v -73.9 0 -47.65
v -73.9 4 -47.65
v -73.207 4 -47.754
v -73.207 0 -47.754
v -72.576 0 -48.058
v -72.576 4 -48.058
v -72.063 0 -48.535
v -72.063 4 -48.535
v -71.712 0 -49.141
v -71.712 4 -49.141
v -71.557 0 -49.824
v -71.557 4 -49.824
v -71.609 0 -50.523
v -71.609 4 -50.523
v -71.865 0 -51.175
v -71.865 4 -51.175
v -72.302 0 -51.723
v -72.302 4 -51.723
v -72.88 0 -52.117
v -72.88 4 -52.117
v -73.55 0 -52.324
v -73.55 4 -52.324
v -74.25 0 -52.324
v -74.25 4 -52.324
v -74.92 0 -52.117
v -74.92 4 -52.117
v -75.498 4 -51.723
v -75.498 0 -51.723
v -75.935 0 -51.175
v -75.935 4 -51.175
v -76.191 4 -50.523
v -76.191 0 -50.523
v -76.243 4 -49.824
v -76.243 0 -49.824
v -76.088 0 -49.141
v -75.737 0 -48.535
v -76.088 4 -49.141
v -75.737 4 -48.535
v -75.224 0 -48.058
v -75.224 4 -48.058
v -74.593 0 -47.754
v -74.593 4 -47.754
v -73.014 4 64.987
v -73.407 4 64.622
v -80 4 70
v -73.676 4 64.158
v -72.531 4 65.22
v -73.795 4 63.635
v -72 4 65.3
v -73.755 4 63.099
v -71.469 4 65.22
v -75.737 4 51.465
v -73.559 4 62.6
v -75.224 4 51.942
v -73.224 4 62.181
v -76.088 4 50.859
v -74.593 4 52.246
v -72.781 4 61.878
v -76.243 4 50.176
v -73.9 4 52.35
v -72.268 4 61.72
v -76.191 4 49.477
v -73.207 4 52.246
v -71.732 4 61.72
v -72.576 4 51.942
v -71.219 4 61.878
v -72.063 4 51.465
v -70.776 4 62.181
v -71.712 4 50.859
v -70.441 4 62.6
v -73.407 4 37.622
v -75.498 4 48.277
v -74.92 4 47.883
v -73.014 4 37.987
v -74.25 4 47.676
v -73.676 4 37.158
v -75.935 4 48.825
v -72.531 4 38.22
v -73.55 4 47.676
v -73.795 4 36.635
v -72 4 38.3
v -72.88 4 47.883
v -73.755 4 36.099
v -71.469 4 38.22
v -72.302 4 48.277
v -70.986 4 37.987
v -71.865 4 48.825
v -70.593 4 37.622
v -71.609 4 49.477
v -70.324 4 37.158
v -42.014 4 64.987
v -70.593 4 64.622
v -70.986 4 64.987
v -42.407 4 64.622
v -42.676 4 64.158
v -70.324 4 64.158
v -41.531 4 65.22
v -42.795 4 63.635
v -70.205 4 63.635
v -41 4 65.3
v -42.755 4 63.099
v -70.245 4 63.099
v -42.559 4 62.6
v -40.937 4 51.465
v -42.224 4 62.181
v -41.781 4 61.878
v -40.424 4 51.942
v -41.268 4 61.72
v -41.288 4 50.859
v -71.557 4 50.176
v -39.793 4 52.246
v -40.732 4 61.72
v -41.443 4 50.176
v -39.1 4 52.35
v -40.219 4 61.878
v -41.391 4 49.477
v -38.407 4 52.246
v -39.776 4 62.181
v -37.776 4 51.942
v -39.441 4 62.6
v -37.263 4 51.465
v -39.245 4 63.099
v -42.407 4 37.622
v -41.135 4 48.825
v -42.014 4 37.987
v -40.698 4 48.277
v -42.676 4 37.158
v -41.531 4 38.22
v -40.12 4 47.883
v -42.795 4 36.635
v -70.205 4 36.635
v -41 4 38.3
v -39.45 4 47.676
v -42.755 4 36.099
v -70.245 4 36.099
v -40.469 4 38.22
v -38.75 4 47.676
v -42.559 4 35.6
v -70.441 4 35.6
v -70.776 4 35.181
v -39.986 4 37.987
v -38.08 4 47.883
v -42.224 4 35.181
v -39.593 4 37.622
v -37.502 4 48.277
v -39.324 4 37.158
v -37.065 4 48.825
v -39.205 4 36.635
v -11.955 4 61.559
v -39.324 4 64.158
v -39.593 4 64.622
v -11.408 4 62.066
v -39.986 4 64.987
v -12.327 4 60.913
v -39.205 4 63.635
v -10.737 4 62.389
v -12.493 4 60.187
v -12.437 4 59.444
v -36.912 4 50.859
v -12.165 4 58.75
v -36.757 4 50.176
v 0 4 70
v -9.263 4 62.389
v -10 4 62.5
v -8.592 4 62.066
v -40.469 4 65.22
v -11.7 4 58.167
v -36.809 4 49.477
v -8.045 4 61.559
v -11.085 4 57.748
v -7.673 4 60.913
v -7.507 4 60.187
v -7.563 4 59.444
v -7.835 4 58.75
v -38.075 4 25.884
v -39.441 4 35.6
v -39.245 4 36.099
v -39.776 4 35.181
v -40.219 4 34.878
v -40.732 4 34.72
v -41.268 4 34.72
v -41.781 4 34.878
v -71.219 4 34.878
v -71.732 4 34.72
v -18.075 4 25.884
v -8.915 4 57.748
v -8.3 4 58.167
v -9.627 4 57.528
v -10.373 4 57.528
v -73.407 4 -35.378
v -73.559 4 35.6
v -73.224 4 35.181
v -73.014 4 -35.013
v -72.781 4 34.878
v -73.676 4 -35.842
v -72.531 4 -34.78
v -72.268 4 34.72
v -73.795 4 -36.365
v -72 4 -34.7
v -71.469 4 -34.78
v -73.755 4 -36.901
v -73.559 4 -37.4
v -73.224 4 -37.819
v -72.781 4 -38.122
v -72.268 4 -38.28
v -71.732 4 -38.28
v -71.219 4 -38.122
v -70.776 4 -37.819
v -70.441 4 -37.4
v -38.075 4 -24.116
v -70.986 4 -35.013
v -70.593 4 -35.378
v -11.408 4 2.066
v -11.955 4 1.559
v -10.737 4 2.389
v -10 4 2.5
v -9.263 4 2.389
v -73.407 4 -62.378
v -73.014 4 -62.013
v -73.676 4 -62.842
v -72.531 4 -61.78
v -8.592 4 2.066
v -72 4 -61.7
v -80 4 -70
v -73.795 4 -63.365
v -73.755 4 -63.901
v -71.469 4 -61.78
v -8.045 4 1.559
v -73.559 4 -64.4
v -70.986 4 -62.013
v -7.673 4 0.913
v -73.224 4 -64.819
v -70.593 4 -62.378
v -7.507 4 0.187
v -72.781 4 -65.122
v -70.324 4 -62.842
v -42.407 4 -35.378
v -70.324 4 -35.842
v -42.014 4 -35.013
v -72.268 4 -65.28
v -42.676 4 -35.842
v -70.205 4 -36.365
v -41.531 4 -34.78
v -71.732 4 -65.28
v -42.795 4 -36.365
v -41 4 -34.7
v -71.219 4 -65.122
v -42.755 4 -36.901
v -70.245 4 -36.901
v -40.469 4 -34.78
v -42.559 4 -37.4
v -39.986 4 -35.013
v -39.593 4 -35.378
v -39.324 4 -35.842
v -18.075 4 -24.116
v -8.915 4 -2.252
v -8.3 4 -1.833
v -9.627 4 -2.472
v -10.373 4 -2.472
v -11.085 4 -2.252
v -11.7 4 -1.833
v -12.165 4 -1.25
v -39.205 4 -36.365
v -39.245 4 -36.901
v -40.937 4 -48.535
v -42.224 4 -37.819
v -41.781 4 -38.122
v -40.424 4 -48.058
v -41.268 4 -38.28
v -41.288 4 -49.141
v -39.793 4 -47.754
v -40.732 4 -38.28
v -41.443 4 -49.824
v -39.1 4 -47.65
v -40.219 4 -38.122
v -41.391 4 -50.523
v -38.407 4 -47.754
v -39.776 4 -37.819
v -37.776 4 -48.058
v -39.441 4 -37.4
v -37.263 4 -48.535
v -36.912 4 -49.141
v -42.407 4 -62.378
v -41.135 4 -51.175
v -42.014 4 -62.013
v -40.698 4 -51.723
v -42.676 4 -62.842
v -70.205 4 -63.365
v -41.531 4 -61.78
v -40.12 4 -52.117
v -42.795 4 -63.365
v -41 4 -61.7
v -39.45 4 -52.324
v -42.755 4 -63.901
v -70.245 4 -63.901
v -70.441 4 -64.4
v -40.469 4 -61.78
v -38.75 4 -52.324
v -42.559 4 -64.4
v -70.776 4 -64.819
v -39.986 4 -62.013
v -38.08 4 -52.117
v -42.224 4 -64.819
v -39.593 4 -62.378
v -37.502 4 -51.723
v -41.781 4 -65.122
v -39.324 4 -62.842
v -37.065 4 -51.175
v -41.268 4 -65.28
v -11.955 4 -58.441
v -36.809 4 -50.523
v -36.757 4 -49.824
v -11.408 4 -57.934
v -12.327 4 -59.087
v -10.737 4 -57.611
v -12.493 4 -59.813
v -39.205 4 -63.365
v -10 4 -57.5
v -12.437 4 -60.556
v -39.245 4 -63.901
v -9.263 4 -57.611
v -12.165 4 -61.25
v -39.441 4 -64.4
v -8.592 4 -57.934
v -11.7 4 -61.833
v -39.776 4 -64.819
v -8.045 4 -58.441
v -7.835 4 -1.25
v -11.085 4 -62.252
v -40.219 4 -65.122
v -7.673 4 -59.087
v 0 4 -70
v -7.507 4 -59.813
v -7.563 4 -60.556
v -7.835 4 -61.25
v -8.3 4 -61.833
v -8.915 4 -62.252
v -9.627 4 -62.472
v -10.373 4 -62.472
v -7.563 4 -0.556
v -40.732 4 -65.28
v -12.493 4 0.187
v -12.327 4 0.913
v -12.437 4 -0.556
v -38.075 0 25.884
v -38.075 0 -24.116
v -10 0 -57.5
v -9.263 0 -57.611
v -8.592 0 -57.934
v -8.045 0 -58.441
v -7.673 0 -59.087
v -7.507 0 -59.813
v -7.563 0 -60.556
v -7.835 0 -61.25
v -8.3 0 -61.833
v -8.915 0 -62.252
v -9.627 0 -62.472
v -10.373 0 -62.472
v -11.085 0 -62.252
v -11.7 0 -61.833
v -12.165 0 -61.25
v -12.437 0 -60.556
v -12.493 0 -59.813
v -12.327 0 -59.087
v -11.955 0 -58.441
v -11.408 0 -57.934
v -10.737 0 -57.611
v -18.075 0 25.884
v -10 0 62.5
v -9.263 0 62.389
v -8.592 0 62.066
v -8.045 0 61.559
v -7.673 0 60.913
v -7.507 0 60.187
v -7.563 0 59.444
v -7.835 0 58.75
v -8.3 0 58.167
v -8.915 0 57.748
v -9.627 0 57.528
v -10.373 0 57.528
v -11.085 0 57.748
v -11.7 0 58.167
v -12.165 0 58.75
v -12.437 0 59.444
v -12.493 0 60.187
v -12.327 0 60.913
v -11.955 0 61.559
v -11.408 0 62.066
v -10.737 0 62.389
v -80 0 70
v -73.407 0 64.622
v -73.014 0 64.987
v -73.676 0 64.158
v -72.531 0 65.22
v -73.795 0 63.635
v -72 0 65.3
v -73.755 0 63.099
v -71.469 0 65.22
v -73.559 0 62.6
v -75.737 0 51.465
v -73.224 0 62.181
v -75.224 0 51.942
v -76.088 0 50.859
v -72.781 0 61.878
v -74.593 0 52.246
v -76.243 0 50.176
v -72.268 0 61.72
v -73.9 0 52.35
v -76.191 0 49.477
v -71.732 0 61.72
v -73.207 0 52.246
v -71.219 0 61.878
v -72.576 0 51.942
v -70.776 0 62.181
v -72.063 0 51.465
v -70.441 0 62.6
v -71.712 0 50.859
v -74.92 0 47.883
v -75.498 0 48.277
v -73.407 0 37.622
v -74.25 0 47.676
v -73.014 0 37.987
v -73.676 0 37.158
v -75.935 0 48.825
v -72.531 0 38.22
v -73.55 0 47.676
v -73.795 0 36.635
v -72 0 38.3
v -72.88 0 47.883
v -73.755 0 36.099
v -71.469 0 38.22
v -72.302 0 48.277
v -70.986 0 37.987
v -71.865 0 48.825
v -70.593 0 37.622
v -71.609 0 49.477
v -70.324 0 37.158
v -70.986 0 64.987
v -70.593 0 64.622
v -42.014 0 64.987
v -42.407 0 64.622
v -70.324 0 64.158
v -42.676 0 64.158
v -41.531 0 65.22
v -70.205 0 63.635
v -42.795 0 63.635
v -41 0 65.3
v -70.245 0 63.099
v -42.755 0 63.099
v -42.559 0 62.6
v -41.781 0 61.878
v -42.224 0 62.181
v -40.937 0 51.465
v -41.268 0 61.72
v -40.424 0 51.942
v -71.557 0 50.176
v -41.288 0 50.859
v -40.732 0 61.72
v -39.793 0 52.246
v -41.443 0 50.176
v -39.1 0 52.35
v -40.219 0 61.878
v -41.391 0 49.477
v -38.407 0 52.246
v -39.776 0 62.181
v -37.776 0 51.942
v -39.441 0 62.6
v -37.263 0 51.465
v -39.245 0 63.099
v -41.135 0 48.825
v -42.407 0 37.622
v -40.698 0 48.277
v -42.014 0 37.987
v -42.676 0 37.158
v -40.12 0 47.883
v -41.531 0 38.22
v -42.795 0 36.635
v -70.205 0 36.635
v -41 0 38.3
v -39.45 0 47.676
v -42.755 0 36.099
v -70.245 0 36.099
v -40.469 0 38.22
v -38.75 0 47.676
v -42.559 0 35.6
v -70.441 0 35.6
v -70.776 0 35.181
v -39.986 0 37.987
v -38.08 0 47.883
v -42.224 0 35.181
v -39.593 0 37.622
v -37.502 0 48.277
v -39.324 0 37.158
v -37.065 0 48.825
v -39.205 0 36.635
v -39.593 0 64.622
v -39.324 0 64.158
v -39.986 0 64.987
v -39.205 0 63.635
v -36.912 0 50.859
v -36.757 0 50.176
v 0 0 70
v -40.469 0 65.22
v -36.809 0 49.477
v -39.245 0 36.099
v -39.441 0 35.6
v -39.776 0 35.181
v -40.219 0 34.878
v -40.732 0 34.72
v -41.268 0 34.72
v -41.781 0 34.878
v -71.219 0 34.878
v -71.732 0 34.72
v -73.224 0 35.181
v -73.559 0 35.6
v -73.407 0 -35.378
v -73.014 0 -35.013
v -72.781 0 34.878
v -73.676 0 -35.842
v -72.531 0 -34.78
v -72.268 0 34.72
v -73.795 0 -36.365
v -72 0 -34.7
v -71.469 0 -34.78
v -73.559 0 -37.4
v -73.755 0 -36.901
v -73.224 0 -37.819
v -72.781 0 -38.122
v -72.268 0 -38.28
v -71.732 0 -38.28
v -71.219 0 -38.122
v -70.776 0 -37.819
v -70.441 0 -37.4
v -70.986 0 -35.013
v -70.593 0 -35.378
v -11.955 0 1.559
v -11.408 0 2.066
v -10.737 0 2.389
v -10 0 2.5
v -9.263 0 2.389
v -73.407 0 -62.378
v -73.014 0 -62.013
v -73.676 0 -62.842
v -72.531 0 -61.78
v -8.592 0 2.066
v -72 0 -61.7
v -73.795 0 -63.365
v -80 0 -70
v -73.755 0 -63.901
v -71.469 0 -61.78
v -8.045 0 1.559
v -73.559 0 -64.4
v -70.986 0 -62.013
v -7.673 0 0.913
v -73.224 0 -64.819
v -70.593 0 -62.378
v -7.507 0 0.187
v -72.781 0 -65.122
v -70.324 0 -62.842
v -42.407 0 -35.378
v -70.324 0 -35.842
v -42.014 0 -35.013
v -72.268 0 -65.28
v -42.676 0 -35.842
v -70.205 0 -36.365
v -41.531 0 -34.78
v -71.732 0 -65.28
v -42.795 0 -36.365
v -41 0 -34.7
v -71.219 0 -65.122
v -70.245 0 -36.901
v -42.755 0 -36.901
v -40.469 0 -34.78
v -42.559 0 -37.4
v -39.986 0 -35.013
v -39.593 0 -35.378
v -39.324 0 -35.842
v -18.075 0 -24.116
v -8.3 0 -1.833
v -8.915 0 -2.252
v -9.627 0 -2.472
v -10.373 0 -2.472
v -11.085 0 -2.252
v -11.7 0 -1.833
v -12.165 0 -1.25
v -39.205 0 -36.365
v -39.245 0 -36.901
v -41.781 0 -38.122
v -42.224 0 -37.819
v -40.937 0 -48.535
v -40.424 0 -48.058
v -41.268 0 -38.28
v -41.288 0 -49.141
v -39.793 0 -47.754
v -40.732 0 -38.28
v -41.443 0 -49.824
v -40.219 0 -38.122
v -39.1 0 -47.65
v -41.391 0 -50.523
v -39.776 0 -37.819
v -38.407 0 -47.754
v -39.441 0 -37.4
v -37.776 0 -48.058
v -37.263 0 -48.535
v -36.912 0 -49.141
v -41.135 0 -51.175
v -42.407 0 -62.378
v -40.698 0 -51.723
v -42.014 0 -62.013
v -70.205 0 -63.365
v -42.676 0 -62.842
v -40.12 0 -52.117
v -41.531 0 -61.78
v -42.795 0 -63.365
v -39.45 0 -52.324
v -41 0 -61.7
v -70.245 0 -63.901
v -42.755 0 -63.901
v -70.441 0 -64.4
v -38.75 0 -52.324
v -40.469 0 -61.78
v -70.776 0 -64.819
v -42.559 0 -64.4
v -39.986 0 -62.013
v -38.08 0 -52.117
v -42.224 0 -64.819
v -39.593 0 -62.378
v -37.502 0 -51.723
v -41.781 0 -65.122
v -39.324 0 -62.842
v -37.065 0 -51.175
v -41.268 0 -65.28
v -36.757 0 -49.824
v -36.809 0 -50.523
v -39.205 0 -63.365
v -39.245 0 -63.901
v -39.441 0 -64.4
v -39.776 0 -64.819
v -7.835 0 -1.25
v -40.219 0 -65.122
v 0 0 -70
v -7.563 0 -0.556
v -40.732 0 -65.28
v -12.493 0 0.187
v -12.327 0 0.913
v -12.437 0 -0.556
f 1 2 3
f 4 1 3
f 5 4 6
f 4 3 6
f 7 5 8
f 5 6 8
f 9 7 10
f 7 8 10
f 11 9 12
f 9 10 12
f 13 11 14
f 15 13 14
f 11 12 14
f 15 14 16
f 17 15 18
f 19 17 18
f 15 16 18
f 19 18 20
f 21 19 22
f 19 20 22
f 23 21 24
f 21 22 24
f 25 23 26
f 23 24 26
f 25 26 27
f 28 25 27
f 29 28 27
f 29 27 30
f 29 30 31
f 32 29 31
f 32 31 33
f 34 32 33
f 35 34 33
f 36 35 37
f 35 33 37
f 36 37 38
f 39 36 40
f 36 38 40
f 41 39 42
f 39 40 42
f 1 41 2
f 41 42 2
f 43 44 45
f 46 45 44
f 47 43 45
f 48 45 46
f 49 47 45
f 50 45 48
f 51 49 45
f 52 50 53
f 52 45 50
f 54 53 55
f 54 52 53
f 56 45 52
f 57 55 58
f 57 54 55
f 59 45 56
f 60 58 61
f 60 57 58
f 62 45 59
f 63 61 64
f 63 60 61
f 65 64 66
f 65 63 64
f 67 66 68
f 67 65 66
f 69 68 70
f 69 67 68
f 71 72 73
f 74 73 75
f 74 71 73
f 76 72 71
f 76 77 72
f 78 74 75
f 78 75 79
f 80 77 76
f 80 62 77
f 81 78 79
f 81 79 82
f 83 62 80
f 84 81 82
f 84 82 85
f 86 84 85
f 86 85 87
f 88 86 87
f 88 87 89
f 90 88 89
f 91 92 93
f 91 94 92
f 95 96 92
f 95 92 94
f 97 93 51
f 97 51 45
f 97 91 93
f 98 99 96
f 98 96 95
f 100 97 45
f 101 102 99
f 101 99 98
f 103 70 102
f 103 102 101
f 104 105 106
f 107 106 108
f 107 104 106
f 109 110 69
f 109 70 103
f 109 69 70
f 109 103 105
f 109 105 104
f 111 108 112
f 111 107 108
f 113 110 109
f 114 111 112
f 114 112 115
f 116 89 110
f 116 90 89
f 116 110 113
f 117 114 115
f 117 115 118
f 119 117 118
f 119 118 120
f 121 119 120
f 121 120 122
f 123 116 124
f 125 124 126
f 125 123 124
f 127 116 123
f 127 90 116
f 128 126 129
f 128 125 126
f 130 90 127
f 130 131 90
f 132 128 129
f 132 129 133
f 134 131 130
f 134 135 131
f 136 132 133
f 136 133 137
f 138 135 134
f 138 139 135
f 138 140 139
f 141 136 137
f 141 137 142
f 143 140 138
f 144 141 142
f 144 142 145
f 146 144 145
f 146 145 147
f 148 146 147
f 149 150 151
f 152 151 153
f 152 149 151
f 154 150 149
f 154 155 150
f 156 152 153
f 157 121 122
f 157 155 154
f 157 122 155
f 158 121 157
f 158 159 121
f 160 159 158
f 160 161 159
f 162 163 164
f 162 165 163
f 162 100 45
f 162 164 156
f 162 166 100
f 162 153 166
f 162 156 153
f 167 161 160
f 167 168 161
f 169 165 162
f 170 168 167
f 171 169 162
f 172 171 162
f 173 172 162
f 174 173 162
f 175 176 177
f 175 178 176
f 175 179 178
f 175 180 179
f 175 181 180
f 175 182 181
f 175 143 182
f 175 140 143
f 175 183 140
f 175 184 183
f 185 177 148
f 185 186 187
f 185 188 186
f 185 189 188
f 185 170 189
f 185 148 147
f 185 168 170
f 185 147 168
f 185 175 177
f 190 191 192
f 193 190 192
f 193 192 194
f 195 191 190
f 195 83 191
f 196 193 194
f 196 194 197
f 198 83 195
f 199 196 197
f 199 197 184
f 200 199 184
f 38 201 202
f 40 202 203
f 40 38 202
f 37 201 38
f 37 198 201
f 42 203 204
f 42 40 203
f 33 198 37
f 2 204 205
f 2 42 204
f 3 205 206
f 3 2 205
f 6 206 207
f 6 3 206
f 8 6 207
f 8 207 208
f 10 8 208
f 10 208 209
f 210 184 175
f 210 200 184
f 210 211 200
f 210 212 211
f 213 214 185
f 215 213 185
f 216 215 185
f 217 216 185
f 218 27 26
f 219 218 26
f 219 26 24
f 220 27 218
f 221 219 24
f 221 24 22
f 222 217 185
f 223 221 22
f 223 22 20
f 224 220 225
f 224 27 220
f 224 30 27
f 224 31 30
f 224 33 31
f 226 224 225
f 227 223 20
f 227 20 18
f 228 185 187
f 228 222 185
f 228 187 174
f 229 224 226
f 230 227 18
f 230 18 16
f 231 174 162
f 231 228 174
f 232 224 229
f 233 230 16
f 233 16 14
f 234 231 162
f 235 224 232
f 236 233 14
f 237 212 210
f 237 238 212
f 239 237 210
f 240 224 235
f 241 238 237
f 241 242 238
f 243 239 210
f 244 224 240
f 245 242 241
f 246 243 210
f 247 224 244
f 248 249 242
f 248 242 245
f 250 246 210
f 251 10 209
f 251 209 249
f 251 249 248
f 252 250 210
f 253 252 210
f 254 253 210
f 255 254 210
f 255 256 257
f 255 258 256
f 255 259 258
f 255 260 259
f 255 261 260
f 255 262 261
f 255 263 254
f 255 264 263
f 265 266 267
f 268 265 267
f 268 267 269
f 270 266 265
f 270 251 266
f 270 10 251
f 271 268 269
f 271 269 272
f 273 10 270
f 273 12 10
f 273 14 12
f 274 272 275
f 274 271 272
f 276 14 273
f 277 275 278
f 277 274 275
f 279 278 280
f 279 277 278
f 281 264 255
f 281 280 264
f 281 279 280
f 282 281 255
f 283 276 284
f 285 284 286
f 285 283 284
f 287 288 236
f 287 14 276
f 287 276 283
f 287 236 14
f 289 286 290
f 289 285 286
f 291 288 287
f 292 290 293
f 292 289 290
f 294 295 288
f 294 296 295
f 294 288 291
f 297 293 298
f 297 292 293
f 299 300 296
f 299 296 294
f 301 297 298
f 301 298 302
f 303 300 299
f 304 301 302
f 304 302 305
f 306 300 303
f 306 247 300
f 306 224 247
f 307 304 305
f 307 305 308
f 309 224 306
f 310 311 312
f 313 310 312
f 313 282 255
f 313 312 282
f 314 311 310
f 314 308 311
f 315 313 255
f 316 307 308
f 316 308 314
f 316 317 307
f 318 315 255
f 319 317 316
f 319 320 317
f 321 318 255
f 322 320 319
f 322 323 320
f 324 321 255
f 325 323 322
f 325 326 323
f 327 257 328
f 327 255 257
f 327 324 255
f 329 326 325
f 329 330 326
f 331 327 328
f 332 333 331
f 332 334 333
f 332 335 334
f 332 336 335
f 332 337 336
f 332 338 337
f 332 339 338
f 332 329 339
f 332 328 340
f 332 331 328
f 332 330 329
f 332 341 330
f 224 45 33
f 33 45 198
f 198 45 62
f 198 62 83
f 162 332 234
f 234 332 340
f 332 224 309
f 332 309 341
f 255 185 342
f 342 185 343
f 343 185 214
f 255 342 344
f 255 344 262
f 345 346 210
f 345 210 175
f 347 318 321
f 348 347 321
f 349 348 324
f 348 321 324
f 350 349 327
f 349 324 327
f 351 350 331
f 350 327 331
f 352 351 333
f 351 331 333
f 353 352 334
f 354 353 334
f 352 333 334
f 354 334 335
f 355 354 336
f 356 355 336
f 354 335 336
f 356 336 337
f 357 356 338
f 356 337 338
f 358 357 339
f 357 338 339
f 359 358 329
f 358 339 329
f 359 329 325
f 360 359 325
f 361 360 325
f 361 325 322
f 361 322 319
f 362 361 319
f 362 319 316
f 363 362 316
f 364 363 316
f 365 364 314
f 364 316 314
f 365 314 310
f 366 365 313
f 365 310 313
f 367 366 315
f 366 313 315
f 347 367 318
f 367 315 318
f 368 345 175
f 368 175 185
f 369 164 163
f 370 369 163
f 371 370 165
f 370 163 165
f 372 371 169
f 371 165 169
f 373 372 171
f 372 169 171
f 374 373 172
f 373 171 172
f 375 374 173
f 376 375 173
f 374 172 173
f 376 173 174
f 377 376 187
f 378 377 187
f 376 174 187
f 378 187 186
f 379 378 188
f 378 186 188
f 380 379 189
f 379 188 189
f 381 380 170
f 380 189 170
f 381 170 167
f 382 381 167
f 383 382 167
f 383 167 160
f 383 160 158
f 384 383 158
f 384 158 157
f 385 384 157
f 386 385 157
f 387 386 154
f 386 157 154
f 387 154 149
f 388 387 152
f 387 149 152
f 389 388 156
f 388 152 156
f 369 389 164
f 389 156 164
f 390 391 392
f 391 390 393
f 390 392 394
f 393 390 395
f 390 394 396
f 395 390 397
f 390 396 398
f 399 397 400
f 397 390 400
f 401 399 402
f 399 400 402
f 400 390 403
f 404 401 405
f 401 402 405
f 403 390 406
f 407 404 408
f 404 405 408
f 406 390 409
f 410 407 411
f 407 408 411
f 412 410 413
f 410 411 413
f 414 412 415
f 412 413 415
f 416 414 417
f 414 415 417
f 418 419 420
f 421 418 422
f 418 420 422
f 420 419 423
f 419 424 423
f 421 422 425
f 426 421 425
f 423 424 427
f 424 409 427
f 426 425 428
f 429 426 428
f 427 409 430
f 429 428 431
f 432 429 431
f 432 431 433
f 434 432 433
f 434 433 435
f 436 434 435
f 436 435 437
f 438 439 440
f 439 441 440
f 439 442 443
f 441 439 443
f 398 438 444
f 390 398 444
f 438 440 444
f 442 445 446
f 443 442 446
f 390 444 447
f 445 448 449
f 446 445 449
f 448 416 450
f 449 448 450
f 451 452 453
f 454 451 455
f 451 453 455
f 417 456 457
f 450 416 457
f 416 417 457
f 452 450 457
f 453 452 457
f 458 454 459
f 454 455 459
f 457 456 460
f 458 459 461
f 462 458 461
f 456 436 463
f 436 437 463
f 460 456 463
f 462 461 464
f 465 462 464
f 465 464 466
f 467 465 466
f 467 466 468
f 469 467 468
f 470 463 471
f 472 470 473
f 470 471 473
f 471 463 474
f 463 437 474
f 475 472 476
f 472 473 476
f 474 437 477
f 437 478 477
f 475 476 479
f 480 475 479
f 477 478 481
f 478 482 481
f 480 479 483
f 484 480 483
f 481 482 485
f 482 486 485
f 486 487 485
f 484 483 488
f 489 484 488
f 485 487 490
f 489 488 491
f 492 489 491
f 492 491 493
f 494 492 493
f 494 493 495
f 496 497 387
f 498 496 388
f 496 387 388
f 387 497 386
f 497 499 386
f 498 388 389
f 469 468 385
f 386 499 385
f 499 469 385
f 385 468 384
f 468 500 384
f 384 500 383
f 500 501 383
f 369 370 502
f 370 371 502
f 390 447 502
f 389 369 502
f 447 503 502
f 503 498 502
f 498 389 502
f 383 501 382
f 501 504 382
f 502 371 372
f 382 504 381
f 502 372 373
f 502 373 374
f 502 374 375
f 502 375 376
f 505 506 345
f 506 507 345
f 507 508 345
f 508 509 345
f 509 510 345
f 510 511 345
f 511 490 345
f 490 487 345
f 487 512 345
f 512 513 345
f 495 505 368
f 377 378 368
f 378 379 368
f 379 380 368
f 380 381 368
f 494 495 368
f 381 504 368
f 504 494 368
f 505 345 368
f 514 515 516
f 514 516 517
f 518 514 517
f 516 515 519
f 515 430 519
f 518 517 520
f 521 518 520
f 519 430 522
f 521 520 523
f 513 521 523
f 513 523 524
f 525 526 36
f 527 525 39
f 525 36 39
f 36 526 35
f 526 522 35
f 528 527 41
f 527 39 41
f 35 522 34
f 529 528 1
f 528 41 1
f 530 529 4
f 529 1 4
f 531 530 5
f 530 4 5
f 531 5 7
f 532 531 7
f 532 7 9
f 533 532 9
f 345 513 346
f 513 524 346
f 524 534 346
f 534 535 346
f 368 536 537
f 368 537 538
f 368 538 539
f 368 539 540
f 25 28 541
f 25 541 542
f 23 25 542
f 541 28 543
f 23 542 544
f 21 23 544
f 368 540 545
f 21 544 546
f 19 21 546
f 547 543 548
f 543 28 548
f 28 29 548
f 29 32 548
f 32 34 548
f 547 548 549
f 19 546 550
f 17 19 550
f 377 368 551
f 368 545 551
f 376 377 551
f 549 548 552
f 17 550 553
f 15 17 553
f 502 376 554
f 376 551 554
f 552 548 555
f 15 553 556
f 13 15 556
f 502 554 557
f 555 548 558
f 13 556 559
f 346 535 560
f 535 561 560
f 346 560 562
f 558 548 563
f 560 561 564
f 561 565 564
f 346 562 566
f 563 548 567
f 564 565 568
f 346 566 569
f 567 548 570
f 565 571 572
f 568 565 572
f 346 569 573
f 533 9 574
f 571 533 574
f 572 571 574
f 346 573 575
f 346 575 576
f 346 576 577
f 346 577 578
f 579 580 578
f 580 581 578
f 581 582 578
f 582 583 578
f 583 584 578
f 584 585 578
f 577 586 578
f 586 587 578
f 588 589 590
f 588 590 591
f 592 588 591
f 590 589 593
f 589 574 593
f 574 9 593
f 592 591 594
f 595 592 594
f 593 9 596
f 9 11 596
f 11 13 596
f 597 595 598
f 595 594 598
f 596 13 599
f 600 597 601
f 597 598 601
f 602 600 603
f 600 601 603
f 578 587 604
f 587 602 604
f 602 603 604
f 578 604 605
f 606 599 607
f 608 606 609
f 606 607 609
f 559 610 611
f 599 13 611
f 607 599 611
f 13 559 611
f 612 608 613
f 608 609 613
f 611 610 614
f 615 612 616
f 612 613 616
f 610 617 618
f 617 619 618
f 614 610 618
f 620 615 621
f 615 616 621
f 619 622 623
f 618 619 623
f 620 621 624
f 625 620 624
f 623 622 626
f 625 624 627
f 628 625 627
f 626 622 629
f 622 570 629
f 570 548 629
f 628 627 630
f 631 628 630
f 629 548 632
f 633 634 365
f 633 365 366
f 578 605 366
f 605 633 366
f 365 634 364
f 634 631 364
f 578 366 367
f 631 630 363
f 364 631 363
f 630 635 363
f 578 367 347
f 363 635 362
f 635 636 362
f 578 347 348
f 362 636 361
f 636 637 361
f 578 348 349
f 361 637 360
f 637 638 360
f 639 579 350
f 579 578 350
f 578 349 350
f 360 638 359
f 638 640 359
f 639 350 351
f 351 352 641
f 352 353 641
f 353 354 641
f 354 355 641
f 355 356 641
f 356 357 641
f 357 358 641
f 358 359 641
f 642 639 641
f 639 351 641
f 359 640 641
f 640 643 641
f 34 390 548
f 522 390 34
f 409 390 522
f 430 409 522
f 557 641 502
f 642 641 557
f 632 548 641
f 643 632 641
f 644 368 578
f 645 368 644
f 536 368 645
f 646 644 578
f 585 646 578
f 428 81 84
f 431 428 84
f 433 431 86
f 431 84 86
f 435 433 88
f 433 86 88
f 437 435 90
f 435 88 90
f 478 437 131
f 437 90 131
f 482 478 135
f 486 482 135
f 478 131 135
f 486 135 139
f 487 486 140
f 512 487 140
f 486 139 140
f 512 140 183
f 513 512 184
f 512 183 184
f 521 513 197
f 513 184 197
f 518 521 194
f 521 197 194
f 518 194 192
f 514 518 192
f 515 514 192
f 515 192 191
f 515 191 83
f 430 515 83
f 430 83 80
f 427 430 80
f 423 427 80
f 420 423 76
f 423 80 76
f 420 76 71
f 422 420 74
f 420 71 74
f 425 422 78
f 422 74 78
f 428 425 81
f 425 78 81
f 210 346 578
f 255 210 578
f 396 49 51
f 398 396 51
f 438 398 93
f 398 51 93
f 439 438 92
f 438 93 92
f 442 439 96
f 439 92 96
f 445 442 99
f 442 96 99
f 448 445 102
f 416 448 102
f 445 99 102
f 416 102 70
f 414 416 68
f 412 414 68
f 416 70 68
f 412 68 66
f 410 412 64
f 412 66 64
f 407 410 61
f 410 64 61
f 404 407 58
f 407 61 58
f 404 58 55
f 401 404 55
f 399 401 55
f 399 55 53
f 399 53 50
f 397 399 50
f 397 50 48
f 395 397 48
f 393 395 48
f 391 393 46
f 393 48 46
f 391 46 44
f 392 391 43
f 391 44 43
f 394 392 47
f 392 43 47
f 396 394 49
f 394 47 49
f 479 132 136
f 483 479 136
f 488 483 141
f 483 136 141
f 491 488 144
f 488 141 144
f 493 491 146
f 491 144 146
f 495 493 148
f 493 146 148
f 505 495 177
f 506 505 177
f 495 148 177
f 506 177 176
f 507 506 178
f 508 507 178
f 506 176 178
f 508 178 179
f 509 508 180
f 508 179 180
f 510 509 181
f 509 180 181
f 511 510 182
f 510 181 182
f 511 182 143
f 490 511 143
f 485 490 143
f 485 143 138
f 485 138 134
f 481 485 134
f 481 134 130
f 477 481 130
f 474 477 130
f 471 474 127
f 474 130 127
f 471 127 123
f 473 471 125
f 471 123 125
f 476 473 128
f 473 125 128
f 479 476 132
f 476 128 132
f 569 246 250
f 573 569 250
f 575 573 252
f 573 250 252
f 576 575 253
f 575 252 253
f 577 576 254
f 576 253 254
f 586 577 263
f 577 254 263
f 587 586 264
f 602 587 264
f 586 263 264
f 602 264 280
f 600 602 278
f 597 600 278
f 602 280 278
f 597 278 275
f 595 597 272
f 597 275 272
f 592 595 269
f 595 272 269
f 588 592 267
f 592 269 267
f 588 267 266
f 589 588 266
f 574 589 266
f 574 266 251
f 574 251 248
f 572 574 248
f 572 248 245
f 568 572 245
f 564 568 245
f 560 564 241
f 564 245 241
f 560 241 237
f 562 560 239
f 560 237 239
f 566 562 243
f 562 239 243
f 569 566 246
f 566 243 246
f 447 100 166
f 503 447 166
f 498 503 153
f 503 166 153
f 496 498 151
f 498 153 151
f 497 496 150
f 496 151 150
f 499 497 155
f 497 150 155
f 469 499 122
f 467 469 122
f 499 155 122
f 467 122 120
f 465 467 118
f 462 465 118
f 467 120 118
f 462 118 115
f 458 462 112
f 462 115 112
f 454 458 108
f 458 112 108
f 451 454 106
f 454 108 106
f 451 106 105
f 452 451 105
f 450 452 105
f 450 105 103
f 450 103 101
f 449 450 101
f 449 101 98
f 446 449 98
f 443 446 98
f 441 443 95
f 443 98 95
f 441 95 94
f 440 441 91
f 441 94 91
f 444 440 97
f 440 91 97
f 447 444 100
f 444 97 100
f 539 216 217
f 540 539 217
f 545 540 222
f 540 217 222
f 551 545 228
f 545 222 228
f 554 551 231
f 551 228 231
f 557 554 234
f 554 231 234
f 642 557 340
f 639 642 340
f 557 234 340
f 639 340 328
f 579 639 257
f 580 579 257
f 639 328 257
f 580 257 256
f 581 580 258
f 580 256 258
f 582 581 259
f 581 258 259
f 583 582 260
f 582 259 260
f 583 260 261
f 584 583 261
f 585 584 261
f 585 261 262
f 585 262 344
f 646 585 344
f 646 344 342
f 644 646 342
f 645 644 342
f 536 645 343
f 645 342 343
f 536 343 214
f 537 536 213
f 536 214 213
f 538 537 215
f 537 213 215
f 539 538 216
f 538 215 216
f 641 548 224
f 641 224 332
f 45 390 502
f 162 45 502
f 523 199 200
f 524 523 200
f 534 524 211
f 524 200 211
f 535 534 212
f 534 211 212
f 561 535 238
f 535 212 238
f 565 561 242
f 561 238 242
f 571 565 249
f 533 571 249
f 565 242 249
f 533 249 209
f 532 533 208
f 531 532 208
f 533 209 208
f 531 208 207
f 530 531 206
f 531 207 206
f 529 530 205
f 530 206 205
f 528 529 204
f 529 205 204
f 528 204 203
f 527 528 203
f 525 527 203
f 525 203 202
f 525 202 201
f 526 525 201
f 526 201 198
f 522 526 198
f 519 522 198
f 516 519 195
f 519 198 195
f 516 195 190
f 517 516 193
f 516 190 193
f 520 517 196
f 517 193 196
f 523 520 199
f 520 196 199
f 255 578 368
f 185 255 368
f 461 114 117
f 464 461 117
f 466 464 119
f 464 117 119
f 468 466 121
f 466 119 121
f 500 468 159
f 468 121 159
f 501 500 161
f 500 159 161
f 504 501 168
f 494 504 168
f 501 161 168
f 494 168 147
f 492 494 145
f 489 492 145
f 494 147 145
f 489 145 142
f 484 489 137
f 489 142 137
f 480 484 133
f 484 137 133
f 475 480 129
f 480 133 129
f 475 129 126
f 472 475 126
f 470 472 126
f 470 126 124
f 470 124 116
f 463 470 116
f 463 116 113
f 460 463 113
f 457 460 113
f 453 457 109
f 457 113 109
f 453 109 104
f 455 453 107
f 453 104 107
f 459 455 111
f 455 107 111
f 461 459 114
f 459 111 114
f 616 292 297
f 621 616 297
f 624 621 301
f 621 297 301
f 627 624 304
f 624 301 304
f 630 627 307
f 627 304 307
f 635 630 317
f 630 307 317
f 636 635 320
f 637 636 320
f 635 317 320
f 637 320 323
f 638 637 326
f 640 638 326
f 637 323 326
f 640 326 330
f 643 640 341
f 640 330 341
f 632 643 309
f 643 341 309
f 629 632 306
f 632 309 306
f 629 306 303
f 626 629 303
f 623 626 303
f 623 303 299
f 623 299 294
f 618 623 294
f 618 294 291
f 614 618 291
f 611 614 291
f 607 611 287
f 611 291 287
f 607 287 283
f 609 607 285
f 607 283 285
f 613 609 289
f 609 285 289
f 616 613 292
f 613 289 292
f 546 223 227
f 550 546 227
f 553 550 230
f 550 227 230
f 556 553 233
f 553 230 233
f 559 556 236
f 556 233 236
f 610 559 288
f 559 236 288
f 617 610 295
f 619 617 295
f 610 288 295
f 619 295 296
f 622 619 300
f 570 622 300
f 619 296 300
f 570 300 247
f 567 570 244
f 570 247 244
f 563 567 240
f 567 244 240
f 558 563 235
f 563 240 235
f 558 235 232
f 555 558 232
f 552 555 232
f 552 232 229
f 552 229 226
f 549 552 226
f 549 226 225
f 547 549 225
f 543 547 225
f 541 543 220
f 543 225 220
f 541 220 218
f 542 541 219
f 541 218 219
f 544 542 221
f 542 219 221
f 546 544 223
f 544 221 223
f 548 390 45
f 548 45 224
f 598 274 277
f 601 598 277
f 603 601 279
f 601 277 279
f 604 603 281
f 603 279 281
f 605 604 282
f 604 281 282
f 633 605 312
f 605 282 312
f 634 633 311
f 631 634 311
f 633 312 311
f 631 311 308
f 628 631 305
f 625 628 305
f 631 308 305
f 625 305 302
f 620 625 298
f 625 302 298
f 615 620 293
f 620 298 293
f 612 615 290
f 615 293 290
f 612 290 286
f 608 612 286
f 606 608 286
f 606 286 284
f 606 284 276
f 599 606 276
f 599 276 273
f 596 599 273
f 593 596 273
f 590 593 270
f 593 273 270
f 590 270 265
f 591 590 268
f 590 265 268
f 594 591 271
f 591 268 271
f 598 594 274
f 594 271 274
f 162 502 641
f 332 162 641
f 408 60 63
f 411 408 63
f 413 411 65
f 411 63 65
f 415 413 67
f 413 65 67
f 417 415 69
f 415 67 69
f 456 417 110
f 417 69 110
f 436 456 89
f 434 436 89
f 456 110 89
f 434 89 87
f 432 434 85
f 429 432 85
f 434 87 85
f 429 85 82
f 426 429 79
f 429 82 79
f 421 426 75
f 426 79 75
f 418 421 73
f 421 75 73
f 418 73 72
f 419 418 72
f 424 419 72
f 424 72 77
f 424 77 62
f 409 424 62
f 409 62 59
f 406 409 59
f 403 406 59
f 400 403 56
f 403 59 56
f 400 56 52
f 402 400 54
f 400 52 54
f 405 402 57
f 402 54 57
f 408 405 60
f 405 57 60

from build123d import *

# Parameters (mm, degrees)
SKETCH_2_W          = 80
SKETCH_2_H          = 140
EXTRUDE_1_DEPTH     = 4
SKETCH_3_R          = 1.8
SKETCH_3_R_2        = 2.35
SKETCH_3_R_3        = 2.5
CUT_EXTRUDE_3_DEPTH = 4
CUT_EXTRUDE_4_REACH = 108.377
SKETCH_4_W          = 20
SKETCH_4_H          = 50


with BuildPart() as part:
    # 草图2 → 凸台-拉伸1 (new body)
    with BuildSketch(Plane(origin=(0, 0, 0), x_dir=(1, 0, 0), z_dir=(0, 1, 0))):
        with Locations((-40, 0)):
            Rectangle(SKETCH_2_W, SKETCH_2_H)
    extrude(amount=EXTRUDE_1_DEPTH)

    # 草图3 → 切除-拉伸3 (cut)
    with BuildSketch(Plane(origin=(0, 4, 0), x_dir=(1, 0, 0), z_dir=(0, 1, 0))):
        with Locations(Location((-72, 63.5, 0), (0, 0, 270))):
            Circle(SKETCH_3_R)
        with Locations(Location((-41, 63.5, 0), (0, 0, 270))):
            Circle(SKETCH_3_R)
        with Locations(Location((-41, 36.5, 0), (0, 0, 270))):
            Circle(SKETCH_3_R)
        with Locations(Location((-72, 36.5, 0), (0, 0, 270))):
            Circle(SKETCH_3_R)
        with Locations(Location((-41, -63.5, 0), (0, 0, 270))):
            Circle(SKETCH_3_R)
        with Locations(Location((-41, -36.5, 0), (0, 0, 270))):
            Circle(SKETCH_3_R)
        with Locations(Location((-72, -36.5, 0), (0, 0, 270))):
            Circle(SKETCH_3_R)
        with Locations(Location((-72, -63.5, 0), (0, 0, 270))):
            Circle(SKETCH_3_R)
        with Locations(Location((-73.9, 50, 0), (0, 0, 270))):
            Circle(SKETCH_3_R_2)
        with Locations(Location((-73.9, -50, 0), (0, 0, 270))):
            Circle(SKETCH_3_R_2)
        with Locations(Location((-39.1, -50, 0), (0, 0, 270))):
            Circle(SKETCH_3_R_2)
        with Locations(Location((-39.1, 50, 0), (0, 0, 270))):
            Circle(SKETCH_3_R_2)
        with Locations(Location((-10, 60, 0), (0, 0, 270))):
            Circle(SKETCH_3_R_3)
        with Locations(Location((-10, 0, 0), (0, 0, 270))):
            Circle(SKETCH_3_R_3)
        with Locations(Location((-10, -60, 0), (0, 0, 270))):
            Circle(SKETCH_3_R_3)
    extrude(amount=-CUT_EXTRUDE_3_DEPTH, mode=Mode.SUBTRACT)

    # 草图4 → 切除-拉伸4 (cut, up to next)
    with BuildSketch(Plane.XZ, mode=Mode.PRIVATE) as cut_extrude_4_sk1:
        with Locations((-28.074591113, 0.884472787)):
            Rectangle(SKETCH_4_W, SKETCH_4_H)
    cut_extrude_4_tool1 = extrude(cut_extrude_4_sk1.sketch, amount=-CUT_EXTRUDE_4_REACH, mode=Mode.PRIVATE) & part.part
    add(cut_extrude_4_tool1.solids().sort_by_distance((-28.074591, 0, 0.884473))[0], mode=Mode.SUBTRACT)


solid = part.part
